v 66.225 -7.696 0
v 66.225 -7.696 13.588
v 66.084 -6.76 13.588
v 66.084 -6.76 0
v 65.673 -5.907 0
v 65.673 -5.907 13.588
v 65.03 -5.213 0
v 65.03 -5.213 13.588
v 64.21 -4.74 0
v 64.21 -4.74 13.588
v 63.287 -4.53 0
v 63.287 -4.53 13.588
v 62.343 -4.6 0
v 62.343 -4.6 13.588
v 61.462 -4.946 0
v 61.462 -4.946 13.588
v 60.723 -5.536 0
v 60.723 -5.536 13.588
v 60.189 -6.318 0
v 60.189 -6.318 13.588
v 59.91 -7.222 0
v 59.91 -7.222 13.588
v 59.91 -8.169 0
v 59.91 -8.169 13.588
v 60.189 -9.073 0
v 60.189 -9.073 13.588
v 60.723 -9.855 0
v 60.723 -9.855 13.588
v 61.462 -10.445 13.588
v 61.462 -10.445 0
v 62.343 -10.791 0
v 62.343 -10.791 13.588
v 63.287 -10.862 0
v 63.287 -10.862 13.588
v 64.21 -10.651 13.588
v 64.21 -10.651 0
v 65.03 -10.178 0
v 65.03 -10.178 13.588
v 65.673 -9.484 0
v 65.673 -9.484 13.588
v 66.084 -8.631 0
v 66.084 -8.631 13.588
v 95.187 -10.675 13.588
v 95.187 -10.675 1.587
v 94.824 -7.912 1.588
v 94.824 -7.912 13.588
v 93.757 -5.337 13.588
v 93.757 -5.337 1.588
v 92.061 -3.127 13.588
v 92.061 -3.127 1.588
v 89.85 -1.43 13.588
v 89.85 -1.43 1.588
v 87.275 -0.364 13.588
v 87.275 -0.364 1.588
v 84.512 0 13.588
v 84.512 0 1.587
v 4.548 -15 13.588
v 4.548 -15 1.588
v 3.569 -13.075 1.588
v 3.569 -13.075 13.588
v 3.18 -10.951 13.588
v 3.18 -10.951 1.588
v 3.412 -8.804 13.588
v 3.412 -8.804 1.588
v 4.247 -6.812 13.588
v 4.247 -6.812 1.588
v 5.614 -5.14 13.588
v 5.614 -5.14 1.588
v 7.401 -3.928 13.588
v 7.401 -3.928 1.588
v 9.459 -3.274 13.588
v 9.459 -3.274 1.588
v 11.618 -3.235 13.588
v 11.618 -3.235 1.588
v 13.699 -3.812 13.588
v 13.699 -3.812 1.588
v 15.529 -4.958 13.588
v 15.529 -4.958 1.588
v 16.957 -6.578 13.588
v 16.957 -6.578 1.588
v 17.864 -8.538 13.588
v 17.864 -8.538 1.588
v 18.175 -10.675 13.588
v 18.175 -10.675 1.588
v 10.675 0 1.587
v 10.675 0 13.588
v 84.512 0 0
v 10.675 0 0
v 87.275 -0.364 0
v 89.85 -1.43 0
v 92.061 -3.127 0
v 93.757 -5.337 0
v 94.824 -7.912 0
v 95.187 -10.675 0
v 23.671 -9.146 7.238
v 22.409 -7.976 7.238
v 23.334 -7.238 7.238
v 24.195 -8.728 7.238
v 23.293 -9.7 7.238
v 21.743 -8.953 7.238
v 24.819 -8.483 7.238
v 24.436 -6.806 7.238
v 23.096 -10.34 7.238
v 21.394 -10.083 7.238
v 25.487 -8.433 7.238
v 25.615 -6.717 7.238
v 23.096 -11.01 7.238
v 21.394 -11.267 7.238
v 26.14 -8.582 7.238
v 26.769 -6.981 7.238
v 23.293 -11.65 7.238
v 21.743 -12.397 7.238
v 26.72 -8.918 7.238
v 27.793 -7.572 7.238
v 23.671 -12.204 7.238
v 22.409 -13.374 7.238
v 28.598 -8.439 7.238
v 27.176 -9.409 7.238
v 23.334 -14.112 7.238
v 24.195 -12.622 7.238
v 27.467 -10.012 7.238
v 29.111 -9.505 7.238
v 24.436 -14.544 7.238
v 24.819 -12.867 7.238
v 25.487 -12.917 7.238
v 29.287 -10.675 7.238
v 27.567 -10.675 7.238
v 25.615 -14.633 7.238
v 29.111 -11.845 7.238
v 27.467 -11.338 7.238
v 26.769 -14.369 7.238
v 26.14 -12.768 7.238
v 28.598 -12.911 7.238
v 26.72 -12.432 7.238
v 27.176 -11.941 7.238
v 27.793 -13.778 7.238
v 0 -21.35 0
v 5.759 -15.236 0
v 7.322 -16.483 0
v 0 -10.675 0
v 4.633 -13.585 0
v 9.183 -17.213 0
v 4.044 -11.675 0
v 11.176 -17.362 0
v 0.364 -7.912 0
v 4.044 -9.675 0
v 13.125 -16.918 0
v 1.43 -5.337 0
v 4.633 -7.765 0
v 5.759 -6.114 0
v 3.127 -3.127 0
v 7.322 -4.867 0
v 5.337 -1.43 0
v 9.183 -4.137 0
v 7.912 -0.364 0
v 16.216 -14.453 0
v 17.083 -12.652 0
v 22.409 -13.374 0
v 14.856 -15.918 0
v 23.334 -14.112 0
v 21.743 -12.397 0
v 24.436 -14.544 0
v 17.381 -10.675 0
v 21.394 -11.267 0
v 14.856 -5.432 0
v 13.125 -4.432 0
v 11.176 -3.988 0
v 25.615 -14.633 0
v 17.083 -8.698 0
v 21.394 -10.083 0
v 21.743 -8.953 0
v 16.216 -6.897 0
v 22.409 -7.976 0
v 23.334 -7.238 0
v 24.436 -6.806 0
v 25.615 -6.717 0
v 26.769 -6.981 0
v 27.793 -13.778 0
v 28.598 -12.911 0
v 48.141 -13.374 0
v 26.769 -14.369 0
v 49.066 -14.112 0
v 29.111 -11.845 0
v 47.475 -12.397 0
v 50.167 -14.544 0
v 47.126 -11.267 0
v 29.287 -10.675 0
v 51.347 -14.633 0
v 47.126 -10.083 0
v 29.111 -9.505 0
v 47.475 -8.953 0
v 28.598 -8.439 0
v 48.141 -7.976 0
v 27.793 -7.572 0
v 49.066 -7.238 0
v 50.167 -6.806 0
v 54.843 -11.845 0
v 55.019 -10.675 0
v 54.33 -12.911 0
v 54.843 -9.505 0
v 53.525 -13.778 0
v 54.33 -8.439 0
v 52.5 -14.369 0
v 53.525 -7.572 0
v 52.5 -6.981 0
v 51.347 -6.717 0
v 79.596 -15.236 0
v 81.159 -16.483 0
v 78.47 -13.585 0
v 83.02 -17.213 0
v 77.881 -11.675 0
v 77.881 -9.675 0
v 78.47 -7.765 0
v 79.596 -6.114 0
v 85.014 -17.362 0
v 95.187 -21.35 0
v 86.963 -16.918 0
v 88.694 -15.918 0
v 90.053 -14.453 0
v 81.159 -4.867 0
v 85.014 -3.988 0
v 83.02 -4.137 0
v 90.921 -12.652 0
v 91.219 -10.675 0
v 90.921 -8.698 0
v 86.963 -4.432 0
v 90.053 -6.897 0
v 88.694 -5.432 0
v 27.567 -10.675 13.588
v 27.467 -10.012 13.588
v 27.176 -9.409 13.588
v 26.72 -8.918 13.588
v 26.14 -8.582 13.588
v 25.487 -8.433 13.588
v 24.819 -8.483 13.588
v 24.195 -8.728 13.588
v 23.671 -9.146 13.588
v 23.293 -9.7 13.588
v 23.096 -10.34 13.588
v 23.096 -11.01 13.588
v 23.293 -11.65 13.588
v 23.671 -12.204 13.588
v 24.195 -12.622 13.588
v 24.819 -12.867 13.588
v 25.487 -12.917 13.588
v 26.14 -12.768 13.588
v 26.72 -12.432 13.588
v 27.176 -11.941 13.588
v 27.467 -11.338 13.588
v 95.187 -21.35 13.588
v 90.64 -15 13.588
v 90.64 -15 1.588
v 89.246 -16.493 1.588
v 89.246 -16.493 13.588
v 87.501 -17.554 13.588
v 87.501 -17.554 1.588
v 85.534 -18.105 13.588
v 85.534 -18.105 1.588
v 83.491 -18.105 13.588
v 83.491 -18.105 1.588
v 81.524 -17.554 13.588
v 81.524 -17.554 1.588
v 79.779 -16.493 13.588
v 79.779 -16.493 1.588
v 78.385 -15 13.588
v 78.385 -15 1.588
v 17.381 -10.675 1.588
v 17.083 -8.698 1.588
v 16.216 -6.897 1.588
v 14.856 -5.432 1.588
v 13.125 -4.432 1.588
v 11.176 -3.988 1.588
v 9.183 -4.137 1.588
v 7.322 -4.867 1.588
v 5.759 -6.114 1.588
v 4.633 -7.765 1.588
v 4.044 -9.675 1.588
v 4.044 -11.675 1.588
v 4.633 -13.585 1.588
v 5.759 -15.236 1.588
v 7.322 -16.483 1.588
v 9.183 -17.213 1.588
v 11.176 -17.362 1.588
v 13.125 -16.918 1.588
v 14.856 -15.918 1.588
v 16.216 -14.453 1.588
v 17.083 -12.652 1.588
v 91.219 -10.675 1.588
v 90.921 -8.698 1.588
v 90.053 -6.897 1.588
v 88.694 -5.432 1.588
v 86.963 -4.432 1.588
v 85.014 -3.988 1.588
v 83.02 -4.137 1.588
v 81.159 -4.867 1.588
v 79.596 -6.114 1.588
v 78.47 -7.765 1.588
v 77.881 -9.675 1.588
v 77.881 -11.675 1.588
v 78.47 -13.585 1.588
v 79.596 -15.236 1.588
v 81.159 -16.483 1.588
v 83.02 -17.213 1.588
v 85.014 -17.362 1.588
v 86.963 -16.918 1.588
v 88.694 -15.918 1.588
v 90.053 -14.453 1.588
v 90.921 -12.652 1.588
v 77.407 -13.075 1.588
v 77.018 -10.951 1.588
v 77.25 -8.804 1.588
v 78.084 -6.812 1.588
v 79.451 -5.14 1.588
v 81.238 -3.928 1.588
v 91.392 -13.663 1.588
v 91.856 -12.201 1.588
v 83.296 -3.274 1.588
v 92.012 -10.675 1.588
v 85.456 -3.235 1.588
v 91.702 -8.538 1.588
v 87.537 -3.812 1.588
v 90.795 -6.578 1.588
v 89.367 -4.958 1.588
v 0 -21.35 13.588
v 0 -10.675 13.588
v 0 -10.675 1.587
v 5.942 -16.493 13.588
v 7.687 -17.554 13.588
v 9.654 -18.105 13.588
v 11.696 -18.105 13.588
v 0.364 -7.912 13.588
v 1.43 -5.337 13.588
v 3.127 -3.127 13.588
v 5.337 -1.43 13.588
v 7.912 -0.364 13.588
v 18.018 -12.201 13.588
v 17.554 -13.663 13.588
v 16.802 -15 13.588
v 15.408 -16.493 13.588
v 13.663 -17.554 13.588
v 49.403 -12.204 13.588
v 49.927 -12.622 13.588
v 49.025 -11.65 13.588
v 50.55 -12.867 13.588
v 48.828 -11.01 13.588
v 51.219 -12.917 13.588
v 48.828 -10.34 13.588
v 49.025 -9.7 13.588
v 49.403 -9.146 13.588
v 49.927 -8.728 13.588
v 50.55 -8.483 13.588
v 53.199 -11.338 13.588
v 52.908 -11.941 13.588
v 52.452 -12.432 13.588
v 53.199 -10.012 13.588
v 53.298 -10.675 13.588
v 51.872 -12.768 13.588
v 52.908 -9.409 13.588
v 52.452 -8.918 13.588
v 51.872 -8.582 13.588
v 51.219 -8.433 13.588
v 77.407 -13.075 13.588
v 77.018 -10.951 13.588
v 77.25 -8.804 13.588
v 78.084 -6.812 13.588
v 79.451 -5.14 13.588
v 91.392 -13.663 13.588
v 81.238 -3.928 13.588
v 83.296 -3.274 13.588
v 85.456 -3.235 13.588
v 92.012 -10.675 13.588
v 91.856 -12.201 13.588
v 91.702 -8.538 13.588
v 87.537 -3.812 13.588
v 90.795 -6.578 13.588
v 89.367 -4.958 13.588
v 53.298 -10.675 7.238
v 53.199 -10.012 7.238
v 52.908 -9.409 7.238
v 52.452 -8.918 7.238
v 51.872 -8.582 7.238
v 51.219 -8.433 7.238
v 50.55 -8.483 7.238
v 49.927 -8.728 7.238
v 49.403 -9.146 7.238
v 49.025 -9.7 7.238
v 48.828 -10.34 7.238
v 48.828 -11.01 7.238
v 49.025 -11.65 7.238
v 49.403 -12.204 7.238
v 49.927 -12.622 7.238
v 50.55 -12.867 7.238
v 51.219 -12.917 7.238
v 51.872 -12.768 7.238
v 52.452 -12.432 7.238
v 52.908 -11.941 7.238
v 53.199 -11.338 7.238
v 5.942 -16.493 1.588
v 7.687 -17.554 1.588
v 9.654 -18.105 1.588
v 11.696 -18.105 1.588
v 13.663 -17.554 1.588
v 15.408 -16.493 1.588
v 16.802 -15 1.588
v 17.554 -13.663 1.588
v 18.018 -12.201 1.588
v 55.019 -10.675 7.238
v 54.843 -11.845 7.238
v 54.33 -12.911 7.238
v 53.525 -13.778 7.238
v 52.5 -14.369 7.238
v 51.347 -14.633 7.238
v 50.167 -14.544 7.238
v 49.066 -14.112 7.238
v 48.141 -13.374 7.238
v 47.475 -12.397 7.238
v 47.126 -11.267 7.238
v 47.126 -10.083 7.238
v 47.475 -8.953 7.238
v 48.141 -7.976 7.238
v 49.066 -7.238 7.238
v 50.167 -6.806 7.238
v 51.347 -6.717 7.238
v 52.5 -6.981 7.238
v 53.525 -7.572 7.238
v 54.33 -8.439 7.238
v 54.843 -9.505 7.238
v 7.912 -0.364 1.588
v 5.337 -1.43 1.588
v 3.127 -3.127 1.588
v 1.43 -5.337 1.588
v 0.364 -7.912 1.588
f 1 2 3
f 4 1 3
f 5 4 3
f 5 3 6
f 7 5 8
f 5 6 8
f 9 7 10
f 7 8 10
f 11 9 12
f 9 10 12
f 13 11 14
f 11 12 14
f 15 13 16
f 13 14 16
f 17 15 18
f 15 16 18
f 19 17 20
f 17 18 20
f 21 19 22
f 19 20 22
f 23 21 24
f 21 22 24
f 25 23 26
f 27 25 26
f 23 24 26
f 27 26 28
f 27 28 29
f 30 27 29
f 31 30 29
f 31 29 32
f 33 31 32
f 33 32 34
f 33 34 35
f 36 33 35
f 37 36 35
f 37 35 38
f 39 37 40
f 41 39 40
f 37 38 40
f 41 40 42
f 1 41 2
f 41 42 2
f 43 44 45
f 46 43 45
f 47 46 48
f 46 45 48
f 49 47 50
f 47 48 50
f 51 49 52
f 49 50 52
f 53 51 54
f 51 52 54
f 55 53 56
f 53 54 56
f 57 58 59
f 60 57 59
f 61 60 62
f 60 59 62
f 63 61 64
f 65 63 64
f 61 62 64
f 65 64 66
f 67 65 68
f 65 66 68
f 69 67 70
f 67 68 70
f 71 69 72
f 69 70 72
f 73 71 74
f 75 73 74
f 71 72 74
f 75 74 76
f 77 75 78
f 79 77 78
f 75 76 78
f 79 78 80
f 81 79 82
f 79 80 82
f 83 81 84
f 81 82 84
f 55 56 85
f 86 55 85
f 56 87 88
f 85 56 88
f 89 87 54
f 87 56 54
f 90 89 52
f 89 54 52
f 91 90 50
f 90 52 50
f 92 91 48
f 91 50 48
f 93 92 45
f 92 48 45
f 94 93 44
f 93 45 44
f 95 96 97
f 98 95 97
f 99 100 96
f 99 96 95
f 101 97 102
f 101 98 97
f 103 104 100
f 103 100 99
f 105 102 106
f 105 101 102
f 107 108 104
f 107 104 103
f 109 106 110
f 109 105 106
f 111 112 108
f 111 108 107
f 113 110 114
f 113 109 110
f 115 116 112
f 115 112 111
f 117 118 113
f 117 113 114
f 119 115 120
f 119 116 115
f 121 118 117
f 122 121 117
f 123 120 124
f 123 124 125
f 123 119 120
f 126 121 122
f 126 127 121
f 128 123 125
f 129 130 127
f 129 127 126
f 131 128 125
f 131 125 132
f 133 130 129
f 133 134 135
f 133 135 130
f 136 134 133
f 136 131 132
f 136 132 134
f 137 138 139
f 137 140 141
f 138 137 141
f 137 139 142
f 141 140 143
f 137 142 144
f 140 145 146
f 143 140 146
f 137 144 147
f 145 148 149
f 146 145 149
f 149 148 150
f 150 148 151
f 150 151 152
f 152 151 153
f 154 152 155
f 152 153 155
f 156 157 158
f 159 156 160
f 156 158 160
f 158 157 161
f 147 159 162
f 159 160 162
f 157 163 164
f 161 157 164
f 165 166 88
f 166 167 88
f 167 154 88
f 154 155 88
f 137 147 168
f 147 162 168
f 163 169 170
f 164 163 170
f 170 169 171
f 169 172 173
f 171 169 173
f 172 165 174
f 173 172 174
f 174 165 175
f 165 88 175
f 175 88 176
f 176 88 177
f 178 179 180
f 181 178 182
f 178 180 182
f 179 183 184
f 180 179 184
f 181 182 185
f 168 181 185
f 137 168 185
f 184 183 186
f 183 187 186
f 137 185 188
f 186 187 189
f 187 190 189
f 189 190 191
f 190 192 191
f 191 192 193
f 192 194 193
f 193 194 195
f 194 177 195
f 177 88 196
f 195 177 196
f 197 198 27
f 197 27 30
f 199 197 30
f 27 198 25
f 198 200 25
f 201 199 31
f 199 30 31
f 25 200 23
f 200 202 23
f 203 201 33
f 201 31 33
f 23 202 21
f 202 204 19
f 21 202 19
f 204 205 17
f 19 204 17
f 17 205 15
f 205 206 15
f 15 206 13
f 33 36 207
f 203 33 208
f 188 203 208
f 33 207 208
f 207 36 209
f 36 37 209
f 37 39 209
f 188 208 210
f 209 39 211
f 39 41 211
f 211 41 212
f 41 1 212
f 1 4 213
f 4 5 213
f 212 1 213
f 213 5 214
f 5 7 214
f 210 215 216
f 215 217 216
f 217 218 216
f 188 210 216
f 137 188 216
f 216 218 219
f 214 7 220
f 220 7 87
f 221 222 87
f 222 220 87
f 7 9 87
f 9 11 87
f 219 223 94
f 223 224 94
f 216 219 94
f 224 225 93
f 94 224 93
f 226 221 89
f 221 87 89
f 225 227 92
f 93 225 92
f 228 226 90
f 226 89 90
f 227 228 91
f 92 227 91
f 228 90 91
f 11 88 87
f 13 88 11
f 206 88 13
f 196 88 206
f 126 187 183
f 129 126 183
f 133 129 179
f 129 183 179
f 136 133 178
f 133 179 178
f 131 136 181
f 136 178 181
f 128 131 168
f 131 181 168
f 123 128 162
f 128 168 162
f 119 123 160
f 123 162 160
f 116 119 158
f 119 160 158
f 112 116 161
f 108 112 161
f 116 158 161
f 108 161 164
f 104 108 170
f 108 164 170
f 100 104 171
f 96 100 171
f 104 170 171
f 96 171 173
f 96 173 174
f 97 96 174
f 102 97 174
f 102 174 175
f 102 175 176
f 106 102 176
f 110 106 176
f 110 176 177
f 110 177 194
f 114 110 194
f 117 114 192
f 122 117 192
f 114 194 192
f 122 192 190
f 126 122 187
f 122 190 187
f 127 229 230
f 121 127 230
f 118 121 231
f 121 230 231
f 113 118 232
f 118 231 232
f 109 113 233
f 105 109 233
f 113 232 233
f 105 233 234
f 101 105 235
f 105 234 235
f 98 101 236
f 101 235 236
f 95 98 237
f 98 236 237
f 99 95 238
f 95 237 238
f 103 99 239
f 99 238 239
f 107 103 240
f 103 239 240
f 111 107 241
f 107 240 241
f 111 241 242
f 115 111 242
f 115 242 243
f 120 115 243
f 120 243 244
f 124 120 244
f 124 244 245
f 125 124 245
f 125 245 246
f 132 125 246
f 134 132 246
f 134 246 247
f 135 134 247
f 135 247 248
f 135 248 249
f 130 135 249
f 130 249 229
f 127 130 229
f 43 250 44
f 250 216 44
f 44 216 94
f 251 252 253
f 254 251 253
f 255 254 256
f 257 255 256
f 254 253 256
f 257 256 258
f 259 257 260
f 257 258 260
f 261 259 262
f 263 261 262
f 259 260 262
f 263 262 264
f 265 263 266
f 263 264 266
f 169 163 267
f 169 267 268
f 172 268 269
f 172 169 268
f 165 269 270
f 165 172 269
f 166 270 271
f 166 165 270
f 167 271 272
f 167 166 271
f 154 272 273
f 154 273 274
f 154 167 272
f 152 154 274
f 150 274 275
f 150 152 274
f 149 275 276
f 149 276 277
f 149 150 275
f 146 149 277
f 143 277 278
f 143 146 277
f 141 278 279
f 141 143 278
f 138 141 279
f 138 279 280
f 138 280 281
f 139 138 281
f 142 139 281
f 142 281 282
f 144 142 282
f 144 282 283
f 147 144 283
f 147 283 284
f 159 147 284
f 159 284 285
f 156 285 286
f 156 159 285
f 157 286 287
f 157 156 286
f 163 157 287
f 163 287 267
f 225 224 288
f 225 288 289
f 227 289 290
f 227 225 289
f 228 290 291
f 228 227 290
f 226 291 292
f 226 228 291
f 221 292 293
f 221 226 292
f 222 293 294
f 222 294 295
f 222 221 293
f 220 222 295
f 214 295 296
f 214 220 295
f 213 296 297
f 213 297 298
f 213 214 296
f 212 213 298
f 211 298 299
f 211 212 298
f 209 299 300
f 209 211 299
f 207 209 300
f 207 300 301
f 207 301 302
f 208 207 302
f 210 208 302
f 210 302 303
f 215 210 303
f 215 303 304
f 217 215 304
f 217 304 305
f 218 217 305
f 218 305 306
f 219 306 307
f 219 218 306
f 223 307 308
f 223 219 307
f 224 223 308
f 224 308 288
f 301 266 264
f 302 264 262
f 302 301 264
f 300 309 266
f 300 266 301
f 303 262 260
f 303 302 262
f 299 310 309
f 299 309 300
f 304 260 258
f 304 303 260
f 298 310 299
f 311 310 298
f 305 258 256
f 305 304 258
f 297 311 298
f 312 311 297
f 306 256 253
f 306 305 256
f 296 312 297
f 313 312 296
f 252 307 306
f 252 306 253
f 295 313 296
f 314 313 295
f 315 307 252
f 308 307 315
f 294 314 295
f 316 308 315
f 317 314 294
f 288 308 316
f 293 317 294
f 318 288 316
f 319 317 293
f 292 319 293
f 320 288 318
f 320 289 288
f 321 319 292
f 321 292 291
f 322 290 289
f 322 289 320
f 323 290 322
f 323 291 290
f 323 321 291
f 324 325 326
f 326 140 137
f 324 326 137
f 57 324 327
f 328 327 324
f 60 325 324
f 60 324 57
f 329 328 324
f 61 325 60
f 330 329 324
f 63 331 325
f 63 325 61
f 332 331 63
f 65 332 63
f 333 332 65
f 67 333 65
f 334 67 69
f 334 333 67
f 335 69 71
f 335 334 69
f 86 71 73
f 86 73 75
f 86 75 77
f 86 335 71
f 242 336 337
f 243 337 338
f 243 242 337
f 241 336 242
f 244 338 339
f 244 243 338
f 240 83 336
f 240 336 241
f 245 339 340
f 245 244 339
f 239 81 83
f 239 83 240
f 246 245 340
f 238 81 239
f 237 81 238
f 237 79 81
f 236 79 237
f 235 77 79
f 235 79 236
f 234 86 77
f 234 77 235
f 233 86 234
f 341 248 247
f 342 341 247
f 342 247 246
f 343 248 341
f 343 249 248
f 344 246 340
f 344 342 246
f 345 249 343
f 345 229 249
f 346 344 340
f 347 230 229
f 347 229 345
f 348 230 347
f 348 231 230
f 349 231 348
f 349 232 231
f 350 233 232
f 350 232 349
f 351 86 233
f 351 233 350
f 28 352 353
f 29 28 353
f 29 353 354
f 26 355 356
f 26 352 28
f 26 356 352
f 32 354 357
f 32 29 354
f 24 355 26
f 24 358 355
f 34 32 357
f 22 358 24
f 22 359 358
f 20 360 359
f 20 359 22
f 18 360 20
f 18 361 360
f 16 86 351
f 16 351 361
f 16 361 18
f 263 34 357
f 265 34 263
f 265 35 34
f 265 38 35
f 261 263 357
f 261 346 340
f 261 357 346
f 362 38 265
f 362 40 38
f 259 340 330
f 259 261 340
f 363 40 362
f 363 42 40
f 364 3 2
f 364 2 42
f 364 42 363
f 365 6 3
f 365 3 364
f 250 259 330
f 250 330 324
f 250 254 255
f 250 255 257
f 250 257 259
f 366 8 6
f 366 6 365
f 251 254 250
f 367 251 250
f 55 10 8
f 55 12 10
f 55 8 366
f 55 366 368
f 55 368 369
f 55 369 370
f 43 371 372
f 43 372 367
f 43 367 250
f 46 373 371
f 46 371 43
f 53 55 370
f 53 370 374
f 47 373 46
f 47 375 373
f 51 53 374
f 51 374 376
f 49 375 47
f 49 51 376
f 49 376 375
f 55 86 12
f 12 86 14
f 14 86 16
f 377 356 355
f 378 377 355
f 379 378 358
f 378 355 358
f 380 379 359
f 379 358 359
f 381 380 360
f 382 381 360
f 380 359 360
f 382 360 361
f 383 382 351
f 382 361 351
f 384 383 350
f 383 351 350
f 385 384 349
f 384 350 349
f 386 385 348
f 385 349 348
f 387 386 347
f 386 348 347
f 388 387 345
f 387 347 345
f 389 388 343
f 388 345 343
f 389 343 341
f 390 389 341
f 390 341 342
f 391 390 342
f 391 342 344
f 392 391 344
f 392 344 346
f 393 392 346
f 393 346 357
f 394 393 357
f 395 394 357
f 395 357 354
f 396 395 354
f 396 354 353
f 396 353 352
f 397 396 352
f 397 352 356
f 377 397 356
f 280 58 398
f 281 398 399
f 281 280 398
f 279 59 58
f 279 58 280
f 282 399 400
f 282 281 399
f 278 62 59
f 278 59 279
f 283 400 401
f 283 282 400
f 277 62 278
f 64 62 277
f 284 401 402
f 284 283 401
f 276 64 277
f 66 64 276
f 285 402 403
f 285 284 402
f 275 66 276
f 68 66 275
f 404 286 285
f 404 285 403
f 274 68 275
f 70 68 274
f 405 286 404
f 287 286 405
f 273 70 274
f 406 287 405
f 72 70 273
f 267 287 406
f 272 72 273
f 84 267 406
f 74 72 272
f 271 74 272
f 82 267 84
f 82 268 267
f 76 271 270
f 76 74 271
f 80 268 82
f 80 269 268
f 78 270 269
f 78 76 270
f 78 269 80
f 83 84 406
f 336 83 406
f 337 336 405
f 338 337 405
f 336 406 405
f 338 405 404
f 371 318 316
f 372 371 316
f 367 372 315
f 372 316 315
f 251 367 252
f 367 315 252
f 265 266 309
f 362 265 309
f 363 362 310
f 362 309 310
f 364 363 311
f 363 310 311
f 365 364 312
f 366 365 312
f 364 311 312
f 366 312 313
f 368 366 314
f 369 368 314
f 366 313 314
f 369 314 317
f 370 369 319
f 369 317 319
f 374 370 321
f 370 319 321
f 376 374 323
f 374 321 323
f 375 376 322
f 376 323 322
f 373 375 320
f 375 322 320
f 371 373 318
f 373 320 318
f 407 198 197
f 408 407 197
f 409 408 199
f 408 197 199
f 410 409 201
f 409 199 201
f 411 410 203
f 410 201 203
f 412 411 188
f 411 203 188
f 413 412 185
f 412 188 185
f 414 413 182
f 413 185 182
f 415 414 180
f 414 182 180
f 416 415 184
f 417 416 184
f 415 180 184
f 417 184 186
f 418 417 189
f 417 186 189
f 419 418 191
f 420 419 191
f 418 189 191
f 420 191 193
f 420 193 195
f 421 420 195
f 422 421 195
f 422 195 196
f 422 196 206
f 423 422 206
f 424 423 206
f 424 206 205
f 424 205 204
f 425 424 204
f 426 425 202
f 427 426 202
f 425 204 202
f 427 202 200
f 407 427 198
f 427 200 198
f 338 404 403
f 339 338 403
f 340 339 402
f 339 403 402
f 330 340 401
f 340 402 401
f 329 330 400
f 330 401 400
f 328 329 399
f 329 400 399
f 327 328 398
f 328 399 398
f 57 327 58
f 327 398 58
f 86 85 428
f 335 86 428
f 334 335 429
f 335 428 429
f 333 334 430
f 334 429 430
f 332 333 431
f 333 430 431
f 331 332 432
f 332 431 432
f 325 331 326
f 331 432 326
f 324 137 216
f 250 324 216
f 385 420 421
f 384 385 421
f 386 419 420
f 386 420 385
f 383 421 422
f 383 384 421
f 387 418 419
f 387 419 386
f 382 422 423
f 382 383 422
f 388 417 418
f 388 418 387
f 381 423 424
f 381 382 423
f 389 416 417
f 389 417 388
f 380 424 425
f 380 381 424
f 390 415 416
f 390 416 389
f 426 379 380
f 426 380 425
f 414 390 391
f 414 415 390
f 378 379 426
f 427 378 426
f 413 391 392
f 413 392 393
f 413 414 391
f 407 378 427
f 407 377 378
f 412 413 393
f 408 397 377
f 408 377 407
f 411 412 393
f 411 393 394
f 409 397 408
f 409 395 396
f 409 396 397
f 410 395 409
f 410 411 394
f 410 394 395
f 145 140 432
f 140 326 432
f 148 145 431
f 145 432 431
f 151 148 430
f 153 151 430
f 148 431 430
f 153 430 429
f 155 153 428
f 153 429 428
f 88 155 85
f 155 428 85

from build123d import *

# Parameters (mm, degrees)
F0_W     = 95.1874652
F0_H     = 21.3499954
F0_R     = 6.7062477
F1_DEPTH = 1.5875
F2_R     = 10.6749977
F4_DEPTH = 12
F5_R     = 2.2479
F5_R_2   = 3.175
F6_DEPTH = 13.5875
F7_R     = 3.96875
F8_DEPTH = 7.2375014


with BuildPart() as f1:
    # F0 (on Top) → F1 (new body)
    with BuildSketch(Plane.XY):
        with Locations((47.5937326, -10.6749977)):
            Rectangle(F0_W, F0_H)
        with Locations((10.6749977, -10.6749977)):
            Circle(F0_R, mode=Mode.SUBTRACT)
        with Locations((84.5124675, -10.6749977)):
            Circle(F0_R, mode=Mode.SUBTRACT)
    extrude(amount=F1_DEPTH)

    # F2
    f2_edges = [f1.edges().sort_by_distance(p)[0] for p in [
        (0, 0, 0.79375),
        (95.187465, 0, 0.79375),
    ]]
    fillet(f2_edges, radius=F2_R)

    # F3 (on face) → F4 (join)
    with BuildSketch(Plane.XY.offset(1.5875)):
        with BuildLine():
            Line((4.5476495872, -14.9999954), (0, -14.9999954))
            Line((0, -14.9999954), (0, -21.3499954))
            Line((0, -21.3499954), (95.1874652, -21.3499954))
            Line((95.1874652, -21.3499954), (95.1874652, -14.9999954))
            Line((95.1874652, -14.9999954), (90.6398156128, -14.9999954))
            ThreePointArc((90.6398156128, -14.9999954), (84.5124675, -18.1749977), (78.3851193872, -14.9999954))
            Line((78.3851193872, -14.9999954), (16.8023458128, -14.9999954))
            ThreePointArc((16.8023458128, -14.9999954), (10.6749977, -18.1749977), (4.5476495872, -14.9999954))
        make_face()
        with BuildLine():
            Line((0, -10.6749977), (0, -14.9999954))
            Line((0, -14.9999954), (4.5476495872, -14.9999954))
            ThreePointArc((4.5476495872, -14.9999954), (8.4061996532, -3.5263925617), (18.1749977, -10.6749977))
            ThreePointArc((18.1749977, -10.6749977), (17.8236028383, -12.9437957468), (16.8023458128, -14.9999954))
            Line((16.8023458128, -14.9999954), (78.3851193872, -14.9999954))
            ThreePointArc((78.3851193872, -14.9999954), (82.2436694532, -3.5263925617), (92.0124675, -10.6749977))
            ThreePointArc((92.0124675, -10.6749977), (91.6610726383, -12.9437957468), (90.6398156128, -14.9999954))
            Line((90.6398156128, -14.9999954), (95.1874652, -14.9999954))
            Line((95.1874652, -14.9999954), (95.1874652, -10.6749977))
            ThreePointArc((95.1874652, -10.6749977), (92.0608307628, -3.1266344372), (84.5124675, 0))
            Line((84.5124675, 0), (10.6749977, 0))
            ThreePointArc((10.6749977, 0), (3.1266344372, -3.1266344372), (0, -10.6749977))
        make_face()
    extrude(amount=F4_DEPTH)

    # F5 (on face) → F6 (cut, through all)
    with BuildSketch(Plane.XY.offset(13.5875)):
        with Locations((51.0505421177, -10.6749977)):
            Circle(F5_R)
        with Locations((63.0499501, -7.6956285)):
            Circle(F5_R_2)
        with Locations((25.3187477, -10.6749977)):
            Circle(F5_R)
    extrude(amount=-F6_DEPTH, mode=Mode.SUBTRACT)

    # F7 (on face) → F8 (cut)
    with BuildSketch(Plane(origin=(0, 0, 0), x_dir=(1, 0, 0), z_dir=(0, 0, -1))):
        with Locations((51.0505421177, 10.6749977)):
            Circle(F7_R)
        with Locations((25.3187477, 10.6749977)):
            Circle(F7_R)
    extrude(amount=-F8_DEPTH, mode=Mode.SUBTRACT)


solid = f1.part
